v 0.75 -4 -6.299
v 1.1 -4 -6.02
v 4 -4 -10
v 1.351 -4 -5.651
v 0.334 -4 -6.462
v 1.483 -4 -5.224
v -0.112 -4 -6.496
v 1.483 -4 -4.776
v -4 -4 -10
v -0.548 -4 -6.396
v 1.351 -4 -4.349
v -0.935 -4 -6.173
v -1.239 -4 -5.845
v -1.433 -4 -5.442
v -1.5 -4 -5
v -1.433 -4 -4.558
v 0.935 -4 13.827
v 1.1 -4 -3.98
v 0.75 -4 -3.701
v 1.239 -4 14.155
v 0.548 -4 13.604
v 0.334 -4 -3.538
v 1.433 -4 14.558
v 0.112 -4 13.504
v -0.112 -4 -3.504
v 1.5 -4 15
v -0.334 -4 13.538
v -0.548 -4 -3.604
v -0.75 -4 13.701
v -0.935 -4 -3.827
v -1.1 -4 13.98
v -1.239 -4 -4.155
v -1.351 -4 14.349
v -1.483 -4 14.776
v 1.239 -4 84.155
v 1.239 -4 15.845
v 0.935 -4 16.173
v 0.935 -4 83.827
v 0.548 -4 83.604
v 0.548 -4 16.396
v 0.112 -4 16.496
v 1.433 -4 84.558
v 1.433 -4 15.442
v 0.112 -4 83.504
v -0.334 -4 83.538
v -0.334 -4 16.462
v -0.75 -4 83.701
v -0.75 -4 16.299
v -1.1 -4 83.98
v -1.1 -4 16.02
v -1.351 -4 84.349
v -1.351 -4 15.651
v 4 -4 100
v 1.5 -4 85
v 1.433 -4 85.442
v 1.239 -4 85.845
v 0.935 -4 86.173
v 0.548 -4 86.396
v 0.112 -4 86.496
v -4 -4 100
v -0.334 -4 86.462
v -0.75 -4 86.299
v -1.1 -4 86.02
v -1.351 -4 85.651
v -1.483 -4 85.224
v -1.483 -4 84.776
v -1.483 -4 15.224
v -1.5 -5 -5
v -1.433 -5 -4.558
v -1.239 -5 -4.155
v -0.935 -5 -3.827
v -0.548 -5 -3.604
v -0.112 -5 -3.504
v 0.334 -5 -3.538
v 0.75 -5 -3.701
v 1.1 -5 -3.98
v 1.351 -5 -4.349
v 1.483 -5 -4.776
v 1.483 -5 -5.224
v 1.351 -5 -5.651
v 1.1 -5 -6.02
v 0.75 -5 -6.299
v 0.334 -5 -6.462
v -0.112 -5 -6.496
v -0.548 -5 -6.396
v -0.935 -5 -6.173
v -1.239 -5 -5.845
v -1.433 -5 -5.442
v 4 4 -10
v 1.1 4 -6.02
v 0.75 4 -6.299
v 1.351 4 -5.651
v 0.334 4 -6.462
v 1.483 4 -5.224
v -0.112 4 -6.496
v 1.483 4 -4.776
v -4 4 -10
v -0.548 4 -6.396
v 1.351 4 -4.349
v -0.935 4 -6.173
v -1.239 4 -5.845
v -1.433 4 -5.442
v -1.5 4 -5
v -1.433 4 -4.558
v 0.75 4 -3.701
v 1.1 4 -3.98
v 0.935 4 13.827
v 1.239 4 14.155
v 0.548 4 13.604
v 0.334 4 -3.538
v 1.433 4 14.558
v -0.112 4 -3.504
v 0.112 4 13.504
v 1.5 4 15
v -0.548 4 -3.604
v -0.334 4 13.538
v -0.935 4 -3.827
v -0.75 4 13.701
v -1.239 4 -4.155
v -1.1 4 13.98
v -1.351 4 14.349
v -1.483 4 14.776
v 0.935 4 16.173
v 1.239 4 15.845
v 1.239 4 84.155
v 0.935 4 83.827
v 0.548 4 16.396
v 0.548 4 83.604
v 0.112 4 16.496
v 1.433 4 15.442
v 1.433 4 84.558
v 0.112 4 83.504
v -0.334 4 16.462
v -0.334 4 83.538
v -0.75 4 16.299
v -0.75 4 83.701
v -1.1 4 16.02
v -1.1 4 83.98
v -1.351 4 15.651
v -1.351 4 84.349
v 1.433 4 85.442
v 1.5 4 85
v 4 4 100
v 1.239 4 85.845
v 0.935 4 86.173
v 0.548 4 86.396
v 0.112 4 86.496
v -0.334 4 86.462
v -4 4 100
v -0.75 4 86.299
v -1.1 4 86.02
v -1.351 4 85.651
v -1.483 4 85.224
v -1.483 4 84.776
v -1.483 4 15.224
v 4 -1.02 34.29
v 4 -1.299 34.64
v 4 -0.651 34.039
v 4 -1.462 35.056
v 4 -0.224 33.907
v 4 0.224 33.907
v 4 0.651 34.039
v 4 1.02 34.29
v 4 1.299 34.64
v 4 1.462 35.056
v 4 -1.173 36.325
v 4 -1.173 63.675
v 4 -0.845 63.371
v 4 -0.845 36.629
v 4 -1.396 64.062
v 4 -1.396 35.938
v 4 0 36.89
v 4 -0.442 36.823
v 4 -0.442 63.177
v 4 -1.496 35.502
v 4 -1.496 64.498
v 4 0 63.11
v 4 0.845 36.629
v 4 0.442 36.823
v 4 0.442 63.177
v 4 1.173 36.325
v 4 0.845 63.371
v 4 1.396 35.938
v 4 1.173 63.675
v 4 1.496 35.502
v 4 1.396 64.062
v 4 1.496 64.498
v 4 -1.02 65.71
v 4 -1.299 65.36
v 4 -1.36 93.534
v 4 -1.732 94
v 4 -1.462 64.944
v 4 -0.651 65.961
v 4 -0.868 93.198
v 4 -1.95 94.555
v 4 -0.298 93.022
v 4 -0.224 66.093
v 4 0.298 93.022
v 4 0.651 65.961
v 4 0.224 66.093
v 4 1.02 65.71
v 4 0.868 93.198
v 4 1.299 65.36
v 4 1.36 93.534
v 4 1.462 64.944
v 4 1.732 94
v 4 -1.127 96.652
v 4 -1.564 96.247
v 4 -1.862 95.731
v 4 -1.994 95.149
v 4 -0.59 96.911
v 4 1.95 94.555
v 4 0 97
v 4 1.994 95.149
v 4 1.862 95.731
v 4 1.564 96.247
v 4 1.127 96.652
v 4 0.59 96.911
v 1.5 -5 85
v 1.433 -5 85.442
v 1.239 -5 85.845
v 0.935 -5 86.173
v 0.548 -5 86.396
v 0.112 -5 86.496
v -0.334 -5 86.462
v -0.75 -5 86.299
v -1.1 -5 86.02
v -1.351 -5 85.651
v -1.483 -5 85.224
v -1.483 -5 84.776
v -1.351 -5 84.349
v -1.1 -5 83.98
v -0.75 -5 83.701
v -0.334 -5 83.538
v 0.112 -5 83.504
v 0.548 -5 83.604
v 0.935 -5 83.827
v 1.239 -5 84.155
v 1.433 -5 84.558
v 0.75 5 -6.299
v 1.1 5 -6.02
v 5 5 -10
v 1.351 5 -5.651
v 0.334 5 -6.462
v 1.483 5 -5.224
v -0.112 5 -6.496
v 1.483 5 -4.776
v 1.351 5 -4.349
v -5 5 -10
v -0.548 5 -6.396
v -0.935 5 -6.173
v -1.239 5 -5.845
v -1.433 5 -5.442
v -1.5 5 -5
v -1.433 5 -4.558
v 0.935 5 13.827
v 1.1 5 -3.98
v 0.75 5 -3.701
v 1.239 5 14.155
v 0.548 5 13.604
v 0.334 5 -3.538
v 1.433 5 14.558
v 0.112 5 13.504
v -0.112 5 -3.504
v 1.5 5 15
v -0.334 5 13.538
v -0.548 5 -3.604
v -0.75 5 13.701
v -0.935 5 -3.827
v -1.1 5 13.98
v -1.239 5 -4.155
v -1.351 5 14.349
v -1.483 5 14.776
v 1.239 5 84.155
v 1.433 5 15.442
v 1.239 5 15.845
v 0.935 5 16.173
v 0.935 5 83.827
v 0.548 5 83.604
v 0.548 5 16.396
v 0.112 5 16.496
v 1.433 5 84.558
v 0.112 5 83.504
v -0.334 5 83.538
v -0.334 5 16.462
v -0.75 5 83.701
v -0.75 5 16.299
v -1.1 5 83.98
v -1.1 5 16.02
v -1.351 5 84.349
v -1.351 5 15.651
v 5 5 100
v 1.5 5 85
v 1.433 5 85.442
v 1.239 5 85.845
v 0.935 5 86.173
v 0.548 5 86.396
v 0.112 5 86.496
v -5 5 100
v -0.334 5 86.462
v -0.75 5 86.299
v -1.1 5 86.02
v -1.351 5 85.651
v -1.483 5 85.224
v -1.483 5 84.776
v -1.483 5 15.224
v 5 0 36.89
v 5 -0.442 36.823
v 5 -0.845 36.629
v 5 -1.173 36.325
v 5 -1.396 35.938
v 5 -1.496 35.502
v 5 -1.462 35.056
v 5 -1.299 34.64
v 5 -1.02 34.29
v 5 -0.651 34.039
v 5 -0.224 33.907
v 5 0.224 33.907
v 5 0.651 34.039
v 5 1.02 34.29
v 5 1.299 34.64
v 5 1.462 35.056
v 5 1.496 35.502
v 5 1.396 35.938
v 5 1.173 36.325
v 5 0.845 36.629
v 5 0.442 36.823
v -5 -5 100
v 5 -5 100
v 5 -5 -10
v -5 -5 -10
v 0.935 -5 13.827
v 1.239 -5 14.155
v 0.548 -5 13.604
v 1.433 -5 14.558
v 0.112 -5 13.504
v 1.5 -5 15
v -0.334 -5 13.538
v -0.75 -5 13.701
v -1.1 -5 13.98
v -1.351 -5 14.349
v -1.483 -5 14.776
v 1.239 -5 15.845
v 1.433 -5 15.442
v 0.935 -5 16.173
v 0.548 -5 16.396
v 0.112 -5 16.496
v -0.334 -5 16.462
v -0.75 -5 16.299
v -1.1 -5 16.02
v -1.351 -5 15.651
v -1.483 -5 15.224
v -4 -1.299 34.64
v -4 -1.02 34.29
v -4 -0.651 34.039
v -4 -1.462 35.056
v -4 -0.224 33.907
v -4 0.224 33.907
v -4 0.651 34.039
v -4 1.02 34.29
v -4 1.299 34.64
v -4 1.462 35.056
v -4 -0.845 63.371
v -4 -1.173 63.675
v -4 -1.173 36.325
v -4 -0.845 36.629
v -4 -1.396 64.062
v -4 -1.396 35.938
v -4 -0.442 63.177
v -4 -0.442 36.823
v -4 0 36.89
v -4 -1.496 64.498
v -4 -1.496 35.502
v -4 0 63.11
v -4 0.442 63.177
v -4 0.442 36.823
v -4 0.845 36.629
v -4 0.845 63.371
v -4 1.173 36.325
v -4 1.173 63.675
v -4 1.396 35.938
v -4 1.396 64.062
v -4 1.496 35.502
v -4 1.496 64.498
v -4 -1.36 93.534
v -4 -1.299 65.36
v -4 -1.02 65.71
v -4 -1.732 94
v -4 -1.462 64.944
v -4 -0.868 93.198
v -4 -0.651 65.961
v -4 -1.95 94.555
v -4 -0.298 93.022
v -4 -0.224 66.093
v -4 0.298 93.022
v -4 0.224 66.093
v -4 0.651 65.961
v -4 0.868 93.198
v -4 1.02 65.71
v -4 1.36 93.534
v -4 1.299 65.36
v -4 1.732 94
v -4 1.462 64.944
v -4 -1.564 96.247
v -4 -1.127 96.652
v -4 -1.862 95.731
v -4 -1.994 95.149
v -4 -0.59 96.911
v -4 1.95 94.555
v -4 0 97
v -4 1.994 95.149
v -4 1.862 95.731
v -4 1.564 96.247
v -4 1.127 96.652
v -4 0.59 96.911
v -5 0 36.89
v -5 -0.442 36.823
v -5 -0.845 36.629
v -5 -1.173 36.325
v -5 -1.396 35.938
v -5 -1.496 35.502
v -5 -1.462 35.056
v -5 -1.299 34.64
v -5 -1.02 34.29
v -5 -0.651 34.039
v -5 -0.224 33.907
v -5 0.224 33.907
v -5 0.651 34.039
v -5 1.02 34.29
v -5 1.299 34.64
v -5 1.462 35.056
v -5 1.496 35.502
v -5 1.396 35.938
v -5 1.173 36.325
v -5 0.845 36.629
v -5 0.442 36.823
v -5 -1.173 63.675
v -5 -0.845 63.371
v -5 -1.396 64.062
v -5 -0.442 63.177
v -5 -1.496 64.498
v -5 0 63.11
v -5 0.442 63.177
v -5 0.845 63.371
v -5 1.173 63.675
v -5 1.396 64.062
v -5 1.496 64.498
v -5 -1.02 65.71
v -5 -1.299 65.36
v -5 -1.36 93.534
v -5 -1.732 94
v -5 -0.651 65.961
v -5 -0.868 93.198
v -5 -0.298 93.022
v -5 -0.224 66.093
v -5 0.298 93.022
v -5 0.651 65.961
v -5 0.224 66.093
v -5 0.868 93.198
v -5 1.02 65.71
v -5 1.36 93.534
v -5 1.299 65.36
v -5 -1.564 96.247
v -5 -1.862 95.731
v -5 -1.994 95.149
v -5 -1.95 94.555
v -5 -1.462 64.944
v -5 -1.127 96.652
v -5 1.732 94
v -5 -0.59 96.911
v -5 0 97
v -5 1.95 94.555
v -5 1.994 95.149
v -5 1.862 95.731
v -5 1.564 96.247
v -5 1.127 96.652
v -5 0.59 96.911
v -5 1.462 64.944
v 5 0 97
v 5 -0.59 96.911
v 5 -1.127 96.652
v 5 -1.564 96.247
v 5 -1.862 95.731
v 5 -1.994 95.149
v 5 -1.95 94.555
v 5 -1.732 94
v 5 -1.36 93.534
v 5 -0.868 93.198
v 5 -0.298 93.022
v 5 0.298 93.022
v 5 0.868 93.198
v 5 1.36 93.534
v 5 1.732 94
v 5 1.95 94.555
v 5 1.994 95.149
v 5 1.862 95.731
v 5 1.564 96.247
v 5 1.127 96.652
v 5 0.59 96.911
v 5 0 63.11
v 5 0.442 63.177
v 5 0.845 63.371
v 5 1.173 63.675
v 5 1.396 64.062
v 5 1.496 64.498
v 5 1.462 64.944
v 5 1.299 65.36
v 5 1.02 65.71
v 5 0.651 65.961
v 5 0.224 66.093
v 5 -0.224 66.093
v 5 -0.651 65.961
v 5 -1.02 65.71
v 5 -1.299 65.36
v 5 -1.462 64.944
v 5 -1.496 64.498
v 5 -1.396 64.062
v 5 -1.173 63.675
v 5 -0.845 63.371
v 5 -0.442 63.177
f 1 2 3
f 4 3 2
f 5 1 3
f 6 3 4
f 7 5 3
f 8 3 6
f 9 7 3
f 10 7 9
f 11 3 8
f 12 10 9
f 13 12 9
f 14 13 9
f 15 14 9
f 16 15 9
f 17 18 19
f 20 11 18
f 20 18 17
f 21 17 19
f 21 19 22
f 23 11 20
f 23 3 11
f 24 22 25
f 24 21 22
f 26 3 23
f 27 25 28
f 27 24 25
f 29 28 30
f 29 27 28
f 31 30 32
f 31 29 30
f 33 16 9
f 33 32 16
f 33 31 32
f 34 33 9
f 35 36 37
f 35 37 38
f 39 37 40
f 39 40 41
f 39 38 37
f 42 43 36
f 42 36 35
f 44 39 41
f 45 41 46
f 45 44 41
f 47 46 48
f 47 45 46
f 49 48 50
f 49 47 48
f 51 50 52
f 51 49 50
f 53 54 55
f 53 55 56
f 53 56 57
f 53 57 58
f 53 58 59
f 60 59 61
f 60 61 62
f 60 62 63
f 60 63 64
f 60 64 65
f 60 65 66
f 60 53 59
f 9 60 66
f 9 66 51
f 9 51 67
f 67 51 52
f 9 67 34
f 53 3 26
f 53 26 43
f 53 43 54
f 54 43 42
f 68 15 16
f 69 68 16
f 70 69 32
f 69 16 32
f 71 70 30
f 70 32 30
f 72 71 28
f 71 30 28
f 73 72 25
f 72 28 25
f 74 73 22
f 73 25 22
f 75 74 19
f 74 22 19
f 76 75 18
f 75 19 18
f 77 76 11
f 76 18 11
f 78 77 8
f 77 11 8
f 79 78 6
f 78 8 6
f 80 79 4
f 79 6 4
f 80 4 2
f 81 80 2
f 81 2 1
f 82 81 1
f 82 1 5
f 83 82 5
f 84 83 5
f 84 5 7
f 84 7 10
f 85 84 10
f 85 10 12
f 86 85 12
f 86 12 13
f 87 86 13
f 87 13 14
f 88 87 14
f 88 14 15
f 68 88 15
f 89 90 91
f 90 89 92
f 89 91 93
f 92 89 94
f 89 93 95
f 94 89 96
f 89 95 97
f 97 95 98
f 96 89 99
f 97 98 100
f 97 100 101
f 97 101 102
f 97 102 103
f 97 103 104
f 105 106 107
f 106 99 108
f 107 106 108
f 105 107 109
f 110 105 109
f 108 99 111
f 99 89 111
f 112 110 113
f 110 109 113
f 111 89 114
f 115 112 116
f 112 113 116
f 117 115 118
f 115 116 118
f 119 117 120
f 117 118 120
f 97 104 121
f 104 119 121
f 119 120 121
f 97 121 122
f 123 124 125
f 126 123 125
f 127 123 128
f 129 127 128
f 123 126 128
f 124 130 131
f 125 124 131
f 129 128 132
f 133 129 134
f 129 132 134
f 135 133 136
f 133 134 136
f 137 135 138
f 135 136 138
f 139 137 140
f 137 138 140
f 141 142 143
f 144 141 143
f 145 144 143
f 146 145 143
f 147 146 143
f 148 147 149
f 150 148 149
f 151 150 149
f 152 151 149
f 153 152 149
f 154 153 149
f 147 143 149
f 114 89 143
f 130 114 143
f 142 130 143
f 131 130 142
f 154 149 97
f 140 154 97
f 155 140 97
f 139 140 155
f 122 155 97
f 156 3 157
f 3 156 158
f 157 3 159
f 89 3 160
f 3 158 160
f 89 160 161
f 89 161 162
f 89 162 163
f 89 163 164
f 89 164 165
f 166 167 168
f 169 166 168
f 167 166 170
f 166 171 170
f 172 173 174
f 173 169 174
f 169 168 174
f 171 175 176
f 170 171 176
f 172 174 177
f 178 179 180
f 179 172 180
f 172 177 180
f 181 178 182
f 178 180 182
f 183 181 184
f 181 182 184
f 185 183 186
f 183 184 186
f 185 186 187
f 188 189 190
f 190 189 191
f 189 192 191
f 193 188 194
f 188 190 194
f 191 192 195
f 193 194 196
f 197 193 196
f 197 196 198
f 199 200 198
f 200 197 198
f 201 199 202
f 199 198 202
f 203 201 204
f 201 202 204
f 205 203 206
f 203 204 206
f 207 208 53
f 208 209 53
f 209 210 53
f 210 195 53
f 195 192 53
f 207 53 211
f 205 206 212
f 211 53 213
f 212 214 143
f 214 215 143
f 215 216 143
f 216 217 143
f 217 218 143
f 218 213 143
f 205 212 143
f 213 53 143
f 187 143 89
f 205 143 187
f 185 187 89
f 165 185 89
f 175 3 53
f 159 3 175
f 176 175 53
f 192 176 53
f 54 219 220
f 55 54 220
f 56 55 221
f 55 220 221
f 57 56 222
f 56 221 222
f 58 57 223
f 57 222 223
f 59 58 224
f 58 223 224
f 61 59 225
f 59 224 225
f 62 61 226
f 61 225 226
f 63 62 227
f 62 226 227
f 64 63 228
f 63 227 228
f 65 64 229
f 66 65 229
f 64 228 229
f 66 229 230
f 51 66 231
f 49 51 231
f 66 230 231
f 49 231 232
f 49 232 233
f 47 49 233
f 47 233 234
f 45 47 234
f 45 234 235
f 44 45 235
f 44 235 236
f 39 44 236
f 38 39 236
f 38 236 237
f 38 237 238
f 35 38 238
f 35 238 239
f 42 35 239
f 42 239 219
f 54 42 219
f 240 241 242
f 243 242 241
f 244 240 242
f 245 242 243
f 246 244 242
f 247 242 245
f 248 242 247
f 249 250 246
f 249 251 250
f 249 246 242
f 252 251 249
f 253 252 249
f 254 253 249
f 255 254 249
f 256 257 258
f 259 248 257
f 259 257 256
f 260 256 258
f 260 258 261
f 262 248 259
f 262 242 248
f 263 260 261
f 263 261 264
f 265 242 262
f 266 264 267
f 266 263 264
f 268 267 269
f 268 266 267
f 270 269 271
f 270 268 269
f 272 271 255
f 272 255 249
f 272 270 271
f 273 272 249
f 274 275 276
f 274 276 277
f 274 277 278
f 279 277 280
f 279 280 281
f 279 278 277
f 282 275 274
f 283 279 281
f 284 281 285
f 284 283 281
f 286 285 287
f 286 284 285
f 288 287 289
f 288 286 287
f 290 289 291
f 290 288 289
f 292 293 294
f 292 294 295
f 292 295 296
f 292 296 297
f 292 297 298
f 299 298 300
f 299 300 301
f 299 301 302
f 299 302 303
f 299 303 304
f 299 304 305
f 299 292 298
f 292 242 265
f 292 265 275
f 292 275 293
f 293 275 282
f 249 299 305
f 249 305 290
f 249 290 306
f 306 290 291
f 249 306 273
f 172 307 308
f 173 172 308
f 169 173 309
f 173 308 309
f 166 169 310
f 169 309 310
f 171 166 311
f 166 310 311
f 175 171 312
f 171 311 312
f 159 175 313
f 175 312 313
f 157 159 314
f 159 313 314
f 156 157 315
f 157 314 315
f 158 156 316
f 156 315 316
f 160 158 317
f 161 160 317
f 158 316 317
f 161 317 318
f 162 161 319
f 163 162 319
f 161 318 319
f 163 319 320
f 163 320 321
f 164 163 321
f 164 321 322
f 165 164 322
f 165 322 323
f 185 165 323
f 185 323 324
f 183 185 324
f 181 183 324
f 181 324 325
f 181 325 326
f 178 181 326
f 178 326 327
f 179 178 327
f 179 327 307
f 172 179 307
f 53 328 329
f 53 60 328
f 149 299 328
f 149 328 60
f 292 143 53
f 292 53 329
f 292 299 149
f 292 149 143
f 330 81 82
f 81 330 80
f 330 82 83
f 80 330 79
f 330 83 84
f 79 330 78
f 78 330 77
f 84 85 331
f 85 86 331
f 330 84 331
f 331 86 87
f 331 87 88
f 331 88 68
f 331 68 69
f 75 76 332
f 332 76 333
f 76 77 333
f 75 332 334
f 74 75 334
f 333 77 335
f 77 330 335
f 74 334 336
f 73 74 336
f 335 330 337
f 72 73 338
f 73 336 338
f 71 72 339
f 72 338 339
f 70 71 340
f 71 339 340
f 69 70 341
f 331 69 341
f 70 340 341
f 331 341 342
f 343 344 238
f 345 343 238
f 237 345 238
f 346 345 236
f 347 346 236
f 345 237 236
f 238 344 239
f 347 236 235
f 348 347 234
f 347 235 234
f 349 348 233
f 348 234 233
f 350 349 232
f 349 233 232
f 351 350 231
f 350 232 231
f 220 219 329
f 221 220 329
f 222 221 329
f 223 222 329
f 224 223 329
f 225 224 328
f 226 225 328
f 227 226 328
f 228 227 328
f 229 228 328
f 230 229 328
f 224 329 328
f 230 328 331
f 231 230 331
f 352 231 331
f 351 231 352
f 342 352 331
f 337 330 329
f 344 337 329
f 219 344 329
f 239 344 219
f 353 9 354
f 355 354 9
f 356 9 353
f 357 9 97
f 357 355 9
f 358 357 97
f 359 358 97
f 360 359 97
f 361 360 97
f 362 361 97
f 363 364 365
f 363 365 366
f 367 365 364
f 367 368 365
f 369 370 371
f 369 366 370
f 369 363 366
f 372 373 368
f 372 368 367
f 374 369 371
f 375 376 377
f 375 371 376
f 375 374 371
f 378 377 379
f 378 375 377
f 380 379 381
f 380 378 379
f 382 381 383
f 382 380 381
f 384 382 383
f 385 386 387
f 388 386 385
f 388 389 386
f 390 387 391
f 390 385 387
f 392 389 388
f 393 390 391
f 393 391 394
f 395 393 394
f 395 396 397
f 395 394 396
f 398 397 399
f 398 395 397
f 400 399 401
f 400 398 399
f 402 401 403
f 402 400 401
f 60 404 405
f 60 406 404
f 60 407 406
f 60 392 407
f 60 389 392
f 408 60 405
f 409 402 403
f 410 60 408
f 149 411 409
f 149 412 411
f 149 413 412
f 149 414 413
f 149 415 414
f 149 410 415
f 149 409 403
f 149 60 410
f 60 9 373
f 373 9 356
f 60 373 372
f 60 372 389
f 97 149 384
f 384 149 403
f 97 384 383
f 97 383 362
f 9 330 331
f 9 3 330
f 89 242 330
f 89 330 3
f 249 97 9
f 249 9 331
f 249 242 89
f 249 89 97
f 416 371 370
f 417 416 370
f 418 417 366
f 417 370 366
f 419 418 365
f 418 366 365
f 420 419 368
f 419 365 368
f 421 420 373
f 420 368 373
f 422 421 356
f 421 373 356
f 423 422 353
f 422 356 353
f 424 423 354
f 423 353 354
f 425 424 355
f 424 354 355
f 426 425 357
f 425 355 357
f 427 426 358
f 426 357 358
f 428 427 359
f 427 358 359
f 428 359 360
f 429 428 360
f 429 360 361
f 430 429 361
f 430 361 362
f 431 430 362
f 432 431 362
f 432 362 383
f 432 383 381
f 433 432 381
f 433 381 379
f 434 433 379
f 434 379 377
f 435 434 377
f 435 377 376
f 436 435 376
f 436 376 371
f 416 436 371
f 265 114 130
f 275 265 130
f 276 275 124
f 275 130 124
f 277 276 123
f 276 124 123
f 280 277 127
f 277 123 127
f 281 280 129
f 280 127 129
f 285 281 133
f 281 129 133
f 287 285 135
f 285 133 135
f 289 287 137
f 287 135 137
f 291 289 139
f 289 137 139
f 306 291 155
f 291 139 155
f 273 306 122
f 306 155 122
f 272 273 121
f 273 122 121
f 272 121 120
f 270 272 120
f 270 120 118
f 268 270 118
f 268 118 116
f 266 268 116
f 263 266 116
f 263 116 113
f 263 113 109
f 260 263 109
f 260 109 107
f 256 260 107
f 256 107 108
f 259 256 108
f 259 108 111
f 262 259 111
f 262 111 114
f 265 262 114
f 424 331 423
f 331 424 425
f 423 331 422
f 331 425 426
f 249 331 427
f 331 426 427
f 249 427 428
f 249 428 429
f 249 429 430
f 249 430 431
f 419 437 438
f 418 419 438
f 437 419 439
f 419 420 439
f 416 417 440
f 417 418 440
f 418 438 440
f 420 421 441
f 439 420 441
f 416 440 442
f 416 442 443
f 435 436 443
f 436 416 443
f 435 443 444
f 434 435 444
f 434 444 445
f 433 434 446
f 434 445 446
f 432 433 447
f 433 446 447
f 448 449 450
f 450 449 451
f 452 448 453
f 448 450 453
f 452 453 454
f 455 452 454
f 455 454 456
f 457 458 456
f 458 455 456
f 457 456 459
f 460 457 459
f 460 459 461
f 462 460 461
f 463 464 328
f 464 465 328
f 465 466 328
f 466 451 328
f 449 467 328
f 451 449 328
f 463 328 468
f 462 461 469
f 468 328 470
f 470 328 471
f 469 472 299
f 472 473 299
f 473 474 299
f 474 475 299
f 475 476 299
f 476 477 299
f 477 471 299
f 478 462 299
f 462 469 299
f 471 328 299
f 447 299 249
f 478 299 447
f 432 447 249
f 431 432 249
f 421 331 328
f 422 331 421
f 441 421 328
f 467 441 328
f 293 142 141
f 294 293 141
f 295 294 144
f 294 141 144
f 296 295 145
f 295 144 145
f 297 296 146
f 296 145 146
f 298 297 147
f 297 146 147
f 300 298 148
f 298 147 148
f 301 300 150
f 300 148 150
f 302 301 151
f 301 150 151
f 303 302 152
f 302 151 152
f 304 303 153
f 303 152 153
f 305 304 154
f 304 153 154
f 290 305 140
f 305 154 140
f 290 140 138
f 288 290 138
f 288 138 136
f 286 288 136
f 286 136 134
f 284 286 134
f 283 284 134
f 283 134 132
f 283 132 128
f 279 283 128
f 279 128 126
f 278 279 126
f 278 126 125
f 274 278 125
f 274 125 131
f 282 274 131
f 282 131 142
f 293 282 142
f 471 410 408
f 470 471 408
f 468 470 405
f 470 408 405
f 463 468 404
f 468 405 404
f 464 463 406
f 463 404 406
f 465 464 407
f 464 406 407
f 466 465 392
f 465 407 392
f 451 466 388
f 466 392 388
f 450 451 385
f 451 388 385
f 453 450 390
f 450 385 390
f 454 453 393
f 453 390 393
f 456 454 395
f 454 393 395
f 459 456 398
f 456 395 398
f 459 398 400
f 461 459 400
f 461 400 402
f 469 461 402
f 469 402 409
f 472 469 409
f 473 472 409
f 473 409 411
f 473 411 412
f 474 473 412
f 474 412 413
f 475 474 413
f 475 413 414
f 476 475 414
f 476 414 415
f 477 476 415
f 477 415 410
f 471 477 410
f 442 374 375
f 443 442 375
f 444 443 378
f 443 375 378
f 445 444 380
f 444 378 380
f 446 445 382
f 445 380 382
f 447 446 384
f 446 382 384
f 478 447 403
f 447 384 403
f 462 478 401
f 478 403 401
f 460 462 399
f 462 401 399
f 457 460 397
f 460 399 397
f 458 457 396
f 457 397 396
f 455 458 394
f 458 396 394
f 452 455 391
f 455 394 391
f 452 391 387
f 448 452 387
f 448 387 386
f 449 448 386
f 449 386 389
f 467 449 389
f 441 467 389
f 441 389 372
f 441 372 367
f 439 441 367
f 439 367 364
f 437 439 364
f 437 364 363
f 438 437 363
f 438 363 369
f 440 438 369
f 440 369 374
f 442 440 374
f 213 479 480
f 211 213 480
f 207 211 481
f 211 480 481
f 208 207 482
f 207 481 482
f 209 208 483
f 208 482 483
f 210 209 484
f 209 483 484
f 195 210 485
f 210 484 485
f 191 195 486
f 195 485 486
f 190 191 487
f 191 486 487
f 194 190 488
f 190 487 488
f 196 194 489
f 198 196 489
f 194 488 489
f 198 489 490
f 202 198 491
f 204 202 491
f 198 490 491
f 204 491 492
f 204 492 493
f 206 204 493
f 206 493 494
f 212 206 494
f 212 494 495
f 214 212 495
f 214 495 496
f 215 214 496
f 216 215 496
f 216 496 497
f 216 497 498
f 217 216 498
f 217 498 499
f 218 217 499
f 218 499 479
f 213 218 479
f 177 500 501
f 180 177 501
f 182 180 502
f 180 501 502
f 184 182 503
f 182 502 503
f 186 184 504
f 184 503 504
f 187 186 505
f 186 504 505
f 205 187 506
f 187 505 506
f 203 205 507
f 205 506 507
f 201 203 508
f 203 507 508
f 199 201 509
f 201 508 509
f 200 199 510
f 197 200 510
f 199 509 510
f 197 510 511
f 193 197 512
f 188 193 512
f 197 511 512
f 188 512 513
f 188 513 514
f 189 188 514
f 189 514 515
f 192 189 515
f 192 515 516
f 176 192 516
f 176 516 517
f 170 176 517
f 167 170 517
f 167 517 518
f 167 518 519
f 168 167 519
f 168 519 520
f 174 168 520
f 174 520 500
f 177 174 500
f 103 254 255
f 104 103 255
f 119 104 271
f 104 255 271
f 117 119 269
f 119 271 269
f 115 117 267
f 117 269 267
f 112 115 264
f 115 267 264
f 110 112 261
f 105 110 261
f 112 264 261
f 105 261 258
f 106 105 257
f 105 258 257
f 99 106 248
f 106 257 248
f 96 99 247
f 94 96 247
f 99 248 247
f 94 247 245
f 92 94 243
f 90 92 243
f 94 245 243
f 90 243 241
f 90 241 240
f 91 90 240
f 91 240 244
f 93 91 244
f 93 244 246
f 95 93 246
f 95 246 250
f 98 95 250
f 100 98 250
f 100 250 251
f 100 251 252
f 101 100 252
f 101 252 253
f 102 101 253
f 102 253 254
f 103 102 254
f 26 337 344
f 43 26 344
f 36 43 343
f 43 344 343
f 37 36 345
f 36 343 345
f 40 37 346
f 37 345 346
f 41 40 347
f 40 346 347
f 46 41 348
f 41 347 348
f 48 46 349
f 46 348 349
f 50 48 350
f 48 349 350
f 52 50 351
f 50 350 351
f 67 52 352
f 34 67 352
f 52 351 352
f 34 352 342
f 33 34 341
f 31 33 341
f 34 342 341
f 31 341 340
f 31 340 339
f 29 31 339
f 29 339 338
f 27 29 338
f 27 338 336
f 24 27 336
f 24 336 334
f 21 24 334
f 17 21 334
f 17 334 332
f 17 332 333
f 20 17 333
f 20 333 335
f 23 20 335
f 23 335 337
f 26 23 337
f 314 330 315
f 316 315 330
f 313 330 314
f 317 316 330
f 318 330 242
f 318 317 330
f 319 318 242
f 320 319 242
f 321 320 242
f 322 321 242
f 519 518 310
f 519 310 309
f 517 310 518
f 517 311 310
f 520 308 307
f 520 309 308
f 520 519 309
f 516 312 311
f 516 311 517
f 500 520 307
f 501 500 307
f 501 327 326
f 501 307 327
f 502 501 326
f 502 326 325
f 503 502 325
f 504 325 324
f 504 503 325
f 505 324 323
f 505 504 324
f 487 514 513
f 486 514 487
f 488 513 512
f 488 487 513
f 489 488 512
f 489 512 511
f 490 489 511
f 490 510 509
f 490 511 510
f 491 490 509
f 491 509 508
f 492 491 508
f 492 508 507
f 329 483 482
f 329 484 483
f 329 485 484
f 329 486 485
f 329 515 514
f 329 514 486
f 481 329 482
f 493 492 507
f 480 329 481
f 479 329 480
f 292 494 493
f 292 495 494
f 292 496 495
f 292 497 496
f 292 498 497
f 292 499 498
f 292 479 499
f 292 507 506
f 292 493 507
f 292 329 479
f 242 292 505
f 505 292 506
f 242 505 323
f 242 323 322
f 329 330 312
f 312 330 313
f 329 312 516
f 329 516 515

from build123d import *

# Parameters (mm, degrees)
SKETCH_1_W          = 10
SKETCH_1_H          = 10
SKETCH_1_W_2        = 8
SKETCH_1_H_2        = 8
EXTRUDE_1_DEPTH     = 100
SKETCH_3_R          = 1.5
CUT_EXTRUDE_2_DEPTH = 101.623058987
SKETCH_4_R          = 1.5
SKETCH_4_R_2        = 2
CUT_EXTRUDE_3_DEPTH = 101.623058987
SKETCH_5_W          = 10
SKETCH_5_H          = 10
SKETCH_5_W_2        = 8
SKETCH_5_H_2        = 8
EXTRUDE_2_DEPTH     = 10
SKETCH_6_R          = 1.5
CUT_EXTRUDE_4_DEPTH = 101.623058987


with BuildPart() as part:
    # ｽｹｯﾁ1 → 押し出し-薄板1 (new body)
    with BuildSketch(Plane.XY):
        Rectangle(SKETCH_1_W, SKETCH_1_H)
        Rectangle(SKETCH_1_W_2, SKETCH_1_H_2, mode=Mode.SUBTRACT)
    extrude(amount=EXTRUDE_1_DEPTH)

    # ｽｹｯﾁ3 → ｶｯﾄ - 押し出し2 (cut, through all)
    with BuildSketch(Plane.XZ.offset(5)):
        with Locations((0, 15)):
            Circle(SKETCH_3_R)
        with Locations((0, 85)):
            Circle(SKETCH_3_R)
    extrude(amount=-CUT_EXTRUDE_2_DEPTH, mode=Mode.SUBTRACT)

    # ｽｹｯﾁ4 → ｶｯﾄ - 押し出し3 (cut, through all)
    with BuildSketch(Plane(origin=(5, 0, 0), x_dir=(0, 0, -1), z_dir=(1, 0, 0))):
        with Locations((-64.61, 0)):
            Circle(SKETCH_4_R)
        with Locations(Location((-35.39, 0, 0), (0, 0, 180))):
            Circle(SKETCH_4_R)
        with Locations(Location((-95, 0, 0), (0, 0, 180))):
            Circle(SKETCH_4_R_2)
    extrude(amount=-CUT_EXTRUDE_3_DEPTH, mode=Mode.SUBTRACT)

    # ｽｹｯﾁ5 → 押し出し-薄板2 (add)
    with BuildSketch(Plane(origin=(0, 0, 0), x_dir=(-1, 0, 0), z_dir=(0, 0, -1))):
        Rectangle(SKETCH_5_W, SKETCH_5_H)
        Rectangle(SKETCH_5_W_2, SKETCH_5_H_2, mode=Mode.SUBTRACT)
    extrude(amount=EXTRUDE_2_DEPTH)

    # ｽｹｯﾁ6 → ｶｯﾄ - 押し出し4 (cut, through all)
    with BuildSketch(Plane(origin=(0, 5, 0), x_dir=(1, 0, 0), z_dir=(0, 1, 0))):
        with Locations(Location((0, 5, 0), (0, 0, 180))):
            Circle(SKETCH_6_R)
    extrude(amount=-CUT_EXTRUDE_4_DEPTH, mode=Mode.SUBTRACT)


solid = part.part
